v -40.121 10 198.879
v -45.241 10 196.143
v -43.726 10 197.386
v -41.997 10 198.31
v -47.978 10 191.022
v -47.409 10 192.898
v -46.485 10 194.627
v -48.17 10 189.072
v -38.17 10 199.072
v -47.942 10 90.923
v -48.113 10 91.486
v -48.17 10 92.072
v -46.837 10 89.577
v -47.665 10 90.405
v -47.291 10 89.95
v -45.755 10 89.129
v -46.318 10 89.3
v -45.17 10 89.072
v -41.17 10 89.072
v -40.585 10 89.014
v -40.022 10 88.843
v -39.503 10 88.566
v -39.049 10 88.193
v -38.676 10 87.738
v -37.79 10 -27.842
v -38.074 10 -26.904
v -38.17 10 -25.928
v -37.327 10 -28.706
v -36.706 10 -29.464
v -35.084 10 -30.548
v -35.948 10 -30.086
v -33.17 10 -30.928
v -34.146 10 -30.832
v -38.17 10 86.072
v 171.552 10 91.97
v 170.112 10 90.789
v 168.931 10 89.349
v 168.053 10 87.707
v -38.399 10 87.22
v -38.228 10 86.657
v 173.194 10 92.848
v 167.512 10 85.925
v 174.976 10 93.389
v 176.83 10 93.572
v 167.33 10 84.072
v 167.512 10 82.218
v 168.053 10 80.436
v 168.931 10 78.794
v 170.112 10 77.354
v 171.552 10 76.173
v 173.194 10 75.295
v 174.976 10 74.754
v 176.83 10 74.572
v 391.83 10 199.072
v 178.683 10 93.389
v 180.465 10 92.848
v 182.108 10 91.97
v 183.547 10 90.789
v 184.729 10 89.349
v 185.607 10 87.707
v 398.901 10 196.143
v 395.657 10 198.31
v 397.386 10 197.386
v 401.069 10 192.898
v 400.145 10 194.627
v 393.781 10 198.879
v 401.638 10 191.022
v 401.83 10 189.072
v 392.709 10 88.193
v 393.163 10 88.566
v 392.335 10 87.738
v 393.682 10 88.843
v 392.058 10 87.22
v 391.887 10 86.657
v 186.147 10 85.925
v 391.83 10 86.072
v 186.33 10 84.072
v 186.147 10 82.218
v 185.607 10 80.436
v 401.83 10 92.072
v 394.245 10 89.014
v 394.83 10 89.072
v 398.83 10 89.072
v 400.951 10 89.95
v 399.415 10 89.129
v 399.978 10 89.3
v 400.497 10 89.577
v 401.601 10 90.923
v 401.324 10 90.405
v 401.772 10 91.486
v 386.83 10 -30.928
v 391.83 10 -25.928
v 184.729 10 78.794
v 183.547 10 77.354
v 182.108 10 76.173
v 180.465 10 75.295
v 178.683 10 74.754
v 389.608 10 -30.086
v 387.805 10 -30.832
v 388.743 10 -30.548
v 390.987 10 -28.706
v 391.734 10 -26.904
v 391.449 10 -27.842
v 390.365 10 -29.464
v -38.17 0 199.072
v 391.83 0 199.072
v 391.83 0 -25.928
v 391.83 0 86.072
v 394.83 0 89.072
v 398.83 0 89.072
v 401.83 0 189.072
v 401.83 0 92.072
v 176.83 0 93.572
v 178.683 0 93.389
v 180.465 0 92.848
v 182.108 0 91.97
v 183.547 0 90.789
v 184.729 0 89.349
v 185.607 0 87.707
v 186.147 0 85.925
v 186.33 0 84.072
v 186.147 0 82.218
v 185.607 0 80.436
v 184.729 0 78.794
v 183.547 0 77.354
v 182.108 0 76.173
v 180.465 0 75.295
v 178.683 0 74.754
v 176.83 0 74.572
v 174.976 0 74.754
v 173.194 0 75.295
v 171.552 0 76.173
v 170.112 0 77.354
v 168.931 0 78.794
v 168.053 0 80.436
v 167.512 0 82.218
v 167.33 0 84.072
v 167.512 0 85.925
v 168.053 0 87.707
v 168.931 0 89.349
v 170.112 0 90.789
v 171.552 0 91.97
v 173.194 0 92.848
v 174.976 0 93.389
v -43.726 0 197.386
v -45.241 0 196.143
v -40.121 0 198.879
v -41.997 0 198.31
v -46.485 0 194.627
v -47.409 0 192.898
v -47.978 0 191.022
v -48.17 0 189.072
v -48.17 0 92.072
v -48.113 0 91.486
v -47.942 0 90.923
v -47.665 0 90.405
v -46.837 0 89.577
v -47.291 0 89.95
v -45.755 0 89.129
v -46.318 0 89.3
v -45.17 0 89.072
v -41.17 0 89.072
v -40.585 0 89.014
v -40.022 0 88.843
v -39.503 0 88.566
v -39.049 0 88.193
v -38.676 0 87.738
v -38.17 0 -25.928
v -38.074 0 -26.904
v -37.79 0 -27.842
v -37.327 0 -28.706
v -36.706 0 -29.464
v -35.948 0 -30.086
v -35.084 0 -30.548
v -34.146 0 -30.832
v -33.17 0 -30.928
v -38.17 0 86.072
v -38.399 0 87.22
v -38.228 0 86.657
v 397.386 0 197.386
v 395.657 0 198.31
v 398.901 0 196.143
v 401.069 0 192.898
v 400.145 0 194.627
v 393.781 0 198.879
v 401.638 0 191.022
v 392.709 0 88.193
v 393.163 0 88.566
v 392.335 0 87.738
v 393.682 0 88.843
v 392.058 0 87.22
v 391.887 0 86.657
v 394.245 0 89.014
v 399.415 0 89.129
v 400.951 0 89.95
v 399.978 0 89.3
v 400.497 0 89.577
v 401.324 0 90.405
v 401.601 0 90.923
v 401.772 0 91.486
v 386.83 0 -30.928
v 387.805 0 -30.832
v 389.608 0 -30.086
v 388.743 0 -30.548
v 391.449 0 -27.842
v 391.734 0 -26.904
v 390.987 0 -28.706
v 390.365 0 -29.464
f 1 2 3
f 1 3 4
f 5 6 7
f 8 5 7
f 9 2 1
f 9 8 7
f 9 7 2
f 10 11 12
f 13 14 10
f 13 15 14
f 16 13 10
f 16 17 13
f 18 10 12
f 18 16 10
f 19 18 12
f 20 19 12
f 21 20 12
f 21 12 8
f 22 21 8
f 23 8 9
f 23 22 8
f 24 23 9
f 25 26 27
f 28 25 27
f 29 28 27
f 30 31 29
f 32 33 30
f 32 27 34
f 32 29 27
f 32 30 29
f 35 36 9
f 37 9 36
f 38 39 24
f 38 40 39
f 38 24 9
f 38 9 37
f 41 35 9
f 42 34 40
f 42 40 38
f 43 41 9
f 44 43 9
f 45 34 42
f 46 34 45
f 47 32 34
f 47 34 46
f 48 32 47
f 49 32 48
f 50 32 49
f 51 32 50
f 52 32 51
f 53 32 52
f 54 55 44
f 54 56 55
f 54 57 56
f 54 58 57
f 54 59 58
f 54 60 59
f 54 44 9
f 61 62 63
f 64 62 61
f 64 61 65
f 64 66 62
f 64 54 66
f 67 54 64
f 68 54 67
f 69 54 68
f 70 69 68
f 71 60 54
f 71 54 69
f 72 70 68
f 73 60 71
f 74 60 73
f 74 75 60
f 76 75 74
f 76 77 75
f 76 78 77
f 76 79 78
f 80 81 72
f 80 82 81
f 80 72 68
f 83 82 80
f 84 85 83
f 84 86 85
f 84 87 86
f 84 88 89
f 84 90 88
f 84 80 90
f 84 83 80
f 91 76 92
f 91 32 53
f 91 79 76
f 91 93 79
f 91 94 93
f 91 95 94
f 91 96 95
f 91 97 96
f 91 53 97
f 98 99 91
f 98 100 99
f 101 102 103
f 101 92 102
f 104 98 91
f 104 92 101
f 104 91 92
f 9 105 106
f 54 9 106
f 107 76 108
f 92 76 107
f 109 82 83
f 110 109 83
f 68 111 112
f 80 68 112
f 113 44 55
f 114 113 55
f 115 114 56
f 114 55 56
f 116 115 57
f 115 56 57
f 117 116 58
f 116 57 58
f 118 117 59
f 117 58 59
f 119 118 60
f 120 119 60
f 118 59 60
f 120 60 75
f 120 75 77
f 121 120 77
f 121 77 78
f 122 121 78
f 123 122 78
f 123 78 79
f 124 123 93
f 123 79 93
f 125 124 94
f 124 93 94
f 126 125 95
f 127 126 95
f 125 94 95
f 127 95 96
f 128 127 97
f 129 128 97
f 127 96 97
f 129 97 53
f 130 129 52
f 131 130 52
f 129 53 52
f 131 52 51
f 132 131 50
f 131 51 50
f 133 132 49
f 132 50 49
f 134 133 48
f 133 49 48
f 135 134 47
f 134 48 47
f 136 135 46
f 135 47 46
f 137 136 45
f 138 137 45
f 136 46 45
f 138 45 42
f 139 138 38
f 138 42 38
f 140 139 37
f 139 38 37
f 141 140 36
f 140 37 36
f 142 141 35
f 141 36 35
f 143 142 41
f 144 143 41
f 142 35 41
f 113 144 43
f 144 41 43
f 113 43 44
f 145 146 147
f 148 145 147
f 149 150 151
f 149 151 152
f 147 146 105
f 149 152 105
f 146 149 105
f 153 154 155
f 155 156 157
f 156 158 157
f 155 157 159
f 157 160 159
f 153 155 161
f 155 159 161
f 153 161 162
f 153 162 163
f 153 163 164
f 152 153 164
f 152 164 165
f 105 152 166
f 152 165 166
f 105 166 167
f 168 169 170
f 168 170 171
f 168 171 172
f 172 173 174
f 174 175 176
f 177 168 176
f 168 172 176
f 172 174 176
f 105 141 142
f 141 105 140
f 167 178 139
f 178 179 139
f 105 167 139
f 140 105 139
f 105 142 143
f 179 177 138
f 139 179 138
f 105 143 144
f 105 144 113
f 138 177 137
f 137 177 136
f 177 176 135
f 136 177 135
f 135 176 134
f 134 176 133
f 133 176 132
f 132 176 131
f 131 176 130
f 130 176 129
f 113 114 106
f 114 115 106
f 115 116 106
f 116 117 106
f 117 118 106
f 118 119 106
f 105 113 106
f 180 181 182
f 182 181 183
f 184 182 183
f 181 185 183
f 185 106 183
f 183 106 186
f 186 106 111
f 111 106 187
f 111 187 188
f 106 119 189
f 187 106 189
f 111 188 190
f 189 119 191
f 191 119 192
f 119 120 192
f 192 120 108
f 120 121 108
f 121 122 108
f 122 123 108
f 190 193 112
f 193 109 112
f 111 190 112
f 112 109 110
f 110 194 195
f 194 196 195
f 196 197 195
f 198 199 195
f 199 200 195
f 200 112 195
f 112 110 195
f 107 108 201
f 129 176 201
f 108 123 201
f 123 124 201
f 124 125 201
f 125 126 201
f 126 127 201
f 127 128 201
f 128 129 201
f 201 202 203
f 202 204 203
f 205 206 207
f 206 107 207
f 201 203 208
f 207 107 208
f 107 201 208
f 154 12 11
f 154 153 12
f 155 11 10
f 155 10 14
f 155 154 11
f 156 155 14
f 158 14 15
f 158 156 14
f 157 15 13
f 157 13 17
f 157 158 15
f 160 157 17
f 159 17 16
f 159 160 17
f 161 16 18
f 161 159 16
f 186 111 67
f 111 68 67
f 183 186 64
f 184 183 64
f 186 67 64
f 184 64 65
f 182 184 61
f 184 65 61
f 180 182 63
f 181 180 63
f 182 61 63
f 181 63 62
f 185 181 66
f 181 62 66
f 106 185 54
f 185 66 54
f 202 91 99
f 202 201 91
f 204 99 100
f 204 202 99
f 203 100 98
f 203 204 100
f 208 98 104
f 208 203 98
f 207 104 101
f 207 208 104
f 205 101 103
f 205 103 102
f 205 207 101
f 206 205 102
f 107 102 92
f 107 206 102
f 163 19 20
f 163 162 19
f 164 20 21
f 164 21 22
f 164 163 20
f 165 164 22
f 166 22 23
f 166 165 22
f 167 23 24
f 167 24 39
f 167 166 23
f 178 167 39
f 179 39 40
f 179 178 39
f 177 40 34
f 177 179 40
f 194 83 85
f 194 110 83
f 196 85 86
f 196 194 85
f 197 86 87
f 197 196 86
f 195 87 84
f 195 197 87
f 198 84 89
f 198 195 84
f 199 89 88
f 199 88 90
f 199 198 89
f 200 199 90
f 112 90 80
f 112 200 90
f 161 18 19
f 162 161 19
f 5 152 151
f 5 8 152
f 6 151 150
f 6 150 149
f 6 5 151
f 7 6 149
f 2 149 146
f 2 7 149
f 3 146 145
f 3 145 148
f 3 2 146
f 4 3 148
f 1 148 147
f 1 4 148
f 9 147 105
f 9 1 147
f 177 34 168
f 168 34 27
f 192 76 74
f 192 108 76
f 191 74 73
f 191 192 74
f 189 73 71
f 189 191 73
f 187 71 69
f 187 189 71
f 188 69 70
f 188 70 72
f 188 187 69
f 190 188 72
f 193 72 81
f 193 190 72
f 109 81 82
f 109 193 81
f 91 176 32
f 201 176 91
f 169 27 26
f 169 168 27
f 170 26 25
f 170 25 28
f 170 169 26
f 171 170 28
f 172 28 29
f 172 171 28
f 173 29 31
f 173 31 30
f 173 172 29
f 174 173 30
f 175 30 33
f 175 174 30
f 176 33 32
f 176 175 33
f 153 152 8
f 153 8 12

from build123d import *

# Parameters (mm, degrees)
SKETCH2_W           = 450
SKETCH2_H           = 230
BOSS_EXTRUDE2_DEPTH = 10
SKETCH4_W           = 10
SKETCH4_H           = 120
CUT_EXTRUDE2_DEPTH  = 286
FILLET1_R           = 10
FILLET7_R           = 3
FILLET8_R           = 5
FILLET9_R           = 3
FILLET10_R          = 10
SKETCH5_R           = 9.5
CUT_EXTRUDE4_DEPTH  = 10


with BuildPart() as part:
    # Sketch2 → Boss-Extrude2 (new body)
    with BuildSketch(Plane(origin=(0, 0, 0), x_dir=(1, 0, 0), z_dir=(0, 1, 0))):
        with Locations((176.829853391, -84.071504635)):
            Rectangle(SKETCH2_W, SKETCH2_H)
    extrude(amount=BOSS_EXTRUDE2_DEPTH)

    # Sketch4 → Cut-Extrude2 (cut)
    with BuildSketch(Plane(origin=(0, 10, 0), x_dir=(1, 0, 0), z_dir=(0, 1, 0))):
        with Locations((-43.170146609, -29.071504635)):
            Rectangle(SKETCH4_W, SKETCH4_H)
        with Locations((396.829853391, -29.071504635)):
            Rectangle(SKETCH4_W, SKETCH4_H)
    extrude(amount=-CUT_EXTRUDE2_DEPTH, mode=Mode.SUBTRACT)

    # Fillet1
    fillet1_edges = [part.edges().sort_by_distance(p)[0] for p in [
        (-48.170146609, 5, 199.071504635),
    ]]
    fillet(fillet1_edges, radius=FILLET1_R)

    # Fillet7
    fillet7_edges = [part.edges().sort_by_distance(p)[0] for p in [
        (-48.170146609, 5, 89.071504635),
        (-38.170146609, 5, 89.071504635),
    ]]
    fillet(fillet7_edges, radius=FILLET7_R)

    # Fillet8
    fillet8_edges = [part.edges().sort_by_distance(p)[0] for p in [
        (-38.170146609, 5, -30.928495365),
        (391.829853391, 5, -30.928495365),
    ]]
    fillet(fillet8_edges, radius=FILLET8_R)

    # Fillet9
    fillet9_edges = [part.edges().sort_by_distance(p)[0] for p in [
        (401.829853391, 5, 89.071504635),
        (391.829853391, 5, 89.071504635),
    ]]
    fillet(fillet9_edges, radius=FILLET9_R)

    # Fillet10
    fillet10_edges = [part.edges().sort_by_distance(p)[0] for p in [
        (401.829853391, 5, 199.071504635),
    ]]
    fillet(fillet10_edges, radius=FILLET10_R)

    # Sketch5 → Cut-Extrude4 (cut)
    with BuildSketch(Plane(origin=(0, 10, 0), x_dir=(1, 0, 0), z_dir=(0, 1, 0))):
        with Locations(Location((176.829853391, -84.071504635, 0), (0, 0, 270))):
            Circle(SKETCH5_R)
    extrude(amount=-CUT_EXTRUDE4_DEPTH, mode=Mode.SUBTRACT)


solid = part.part
